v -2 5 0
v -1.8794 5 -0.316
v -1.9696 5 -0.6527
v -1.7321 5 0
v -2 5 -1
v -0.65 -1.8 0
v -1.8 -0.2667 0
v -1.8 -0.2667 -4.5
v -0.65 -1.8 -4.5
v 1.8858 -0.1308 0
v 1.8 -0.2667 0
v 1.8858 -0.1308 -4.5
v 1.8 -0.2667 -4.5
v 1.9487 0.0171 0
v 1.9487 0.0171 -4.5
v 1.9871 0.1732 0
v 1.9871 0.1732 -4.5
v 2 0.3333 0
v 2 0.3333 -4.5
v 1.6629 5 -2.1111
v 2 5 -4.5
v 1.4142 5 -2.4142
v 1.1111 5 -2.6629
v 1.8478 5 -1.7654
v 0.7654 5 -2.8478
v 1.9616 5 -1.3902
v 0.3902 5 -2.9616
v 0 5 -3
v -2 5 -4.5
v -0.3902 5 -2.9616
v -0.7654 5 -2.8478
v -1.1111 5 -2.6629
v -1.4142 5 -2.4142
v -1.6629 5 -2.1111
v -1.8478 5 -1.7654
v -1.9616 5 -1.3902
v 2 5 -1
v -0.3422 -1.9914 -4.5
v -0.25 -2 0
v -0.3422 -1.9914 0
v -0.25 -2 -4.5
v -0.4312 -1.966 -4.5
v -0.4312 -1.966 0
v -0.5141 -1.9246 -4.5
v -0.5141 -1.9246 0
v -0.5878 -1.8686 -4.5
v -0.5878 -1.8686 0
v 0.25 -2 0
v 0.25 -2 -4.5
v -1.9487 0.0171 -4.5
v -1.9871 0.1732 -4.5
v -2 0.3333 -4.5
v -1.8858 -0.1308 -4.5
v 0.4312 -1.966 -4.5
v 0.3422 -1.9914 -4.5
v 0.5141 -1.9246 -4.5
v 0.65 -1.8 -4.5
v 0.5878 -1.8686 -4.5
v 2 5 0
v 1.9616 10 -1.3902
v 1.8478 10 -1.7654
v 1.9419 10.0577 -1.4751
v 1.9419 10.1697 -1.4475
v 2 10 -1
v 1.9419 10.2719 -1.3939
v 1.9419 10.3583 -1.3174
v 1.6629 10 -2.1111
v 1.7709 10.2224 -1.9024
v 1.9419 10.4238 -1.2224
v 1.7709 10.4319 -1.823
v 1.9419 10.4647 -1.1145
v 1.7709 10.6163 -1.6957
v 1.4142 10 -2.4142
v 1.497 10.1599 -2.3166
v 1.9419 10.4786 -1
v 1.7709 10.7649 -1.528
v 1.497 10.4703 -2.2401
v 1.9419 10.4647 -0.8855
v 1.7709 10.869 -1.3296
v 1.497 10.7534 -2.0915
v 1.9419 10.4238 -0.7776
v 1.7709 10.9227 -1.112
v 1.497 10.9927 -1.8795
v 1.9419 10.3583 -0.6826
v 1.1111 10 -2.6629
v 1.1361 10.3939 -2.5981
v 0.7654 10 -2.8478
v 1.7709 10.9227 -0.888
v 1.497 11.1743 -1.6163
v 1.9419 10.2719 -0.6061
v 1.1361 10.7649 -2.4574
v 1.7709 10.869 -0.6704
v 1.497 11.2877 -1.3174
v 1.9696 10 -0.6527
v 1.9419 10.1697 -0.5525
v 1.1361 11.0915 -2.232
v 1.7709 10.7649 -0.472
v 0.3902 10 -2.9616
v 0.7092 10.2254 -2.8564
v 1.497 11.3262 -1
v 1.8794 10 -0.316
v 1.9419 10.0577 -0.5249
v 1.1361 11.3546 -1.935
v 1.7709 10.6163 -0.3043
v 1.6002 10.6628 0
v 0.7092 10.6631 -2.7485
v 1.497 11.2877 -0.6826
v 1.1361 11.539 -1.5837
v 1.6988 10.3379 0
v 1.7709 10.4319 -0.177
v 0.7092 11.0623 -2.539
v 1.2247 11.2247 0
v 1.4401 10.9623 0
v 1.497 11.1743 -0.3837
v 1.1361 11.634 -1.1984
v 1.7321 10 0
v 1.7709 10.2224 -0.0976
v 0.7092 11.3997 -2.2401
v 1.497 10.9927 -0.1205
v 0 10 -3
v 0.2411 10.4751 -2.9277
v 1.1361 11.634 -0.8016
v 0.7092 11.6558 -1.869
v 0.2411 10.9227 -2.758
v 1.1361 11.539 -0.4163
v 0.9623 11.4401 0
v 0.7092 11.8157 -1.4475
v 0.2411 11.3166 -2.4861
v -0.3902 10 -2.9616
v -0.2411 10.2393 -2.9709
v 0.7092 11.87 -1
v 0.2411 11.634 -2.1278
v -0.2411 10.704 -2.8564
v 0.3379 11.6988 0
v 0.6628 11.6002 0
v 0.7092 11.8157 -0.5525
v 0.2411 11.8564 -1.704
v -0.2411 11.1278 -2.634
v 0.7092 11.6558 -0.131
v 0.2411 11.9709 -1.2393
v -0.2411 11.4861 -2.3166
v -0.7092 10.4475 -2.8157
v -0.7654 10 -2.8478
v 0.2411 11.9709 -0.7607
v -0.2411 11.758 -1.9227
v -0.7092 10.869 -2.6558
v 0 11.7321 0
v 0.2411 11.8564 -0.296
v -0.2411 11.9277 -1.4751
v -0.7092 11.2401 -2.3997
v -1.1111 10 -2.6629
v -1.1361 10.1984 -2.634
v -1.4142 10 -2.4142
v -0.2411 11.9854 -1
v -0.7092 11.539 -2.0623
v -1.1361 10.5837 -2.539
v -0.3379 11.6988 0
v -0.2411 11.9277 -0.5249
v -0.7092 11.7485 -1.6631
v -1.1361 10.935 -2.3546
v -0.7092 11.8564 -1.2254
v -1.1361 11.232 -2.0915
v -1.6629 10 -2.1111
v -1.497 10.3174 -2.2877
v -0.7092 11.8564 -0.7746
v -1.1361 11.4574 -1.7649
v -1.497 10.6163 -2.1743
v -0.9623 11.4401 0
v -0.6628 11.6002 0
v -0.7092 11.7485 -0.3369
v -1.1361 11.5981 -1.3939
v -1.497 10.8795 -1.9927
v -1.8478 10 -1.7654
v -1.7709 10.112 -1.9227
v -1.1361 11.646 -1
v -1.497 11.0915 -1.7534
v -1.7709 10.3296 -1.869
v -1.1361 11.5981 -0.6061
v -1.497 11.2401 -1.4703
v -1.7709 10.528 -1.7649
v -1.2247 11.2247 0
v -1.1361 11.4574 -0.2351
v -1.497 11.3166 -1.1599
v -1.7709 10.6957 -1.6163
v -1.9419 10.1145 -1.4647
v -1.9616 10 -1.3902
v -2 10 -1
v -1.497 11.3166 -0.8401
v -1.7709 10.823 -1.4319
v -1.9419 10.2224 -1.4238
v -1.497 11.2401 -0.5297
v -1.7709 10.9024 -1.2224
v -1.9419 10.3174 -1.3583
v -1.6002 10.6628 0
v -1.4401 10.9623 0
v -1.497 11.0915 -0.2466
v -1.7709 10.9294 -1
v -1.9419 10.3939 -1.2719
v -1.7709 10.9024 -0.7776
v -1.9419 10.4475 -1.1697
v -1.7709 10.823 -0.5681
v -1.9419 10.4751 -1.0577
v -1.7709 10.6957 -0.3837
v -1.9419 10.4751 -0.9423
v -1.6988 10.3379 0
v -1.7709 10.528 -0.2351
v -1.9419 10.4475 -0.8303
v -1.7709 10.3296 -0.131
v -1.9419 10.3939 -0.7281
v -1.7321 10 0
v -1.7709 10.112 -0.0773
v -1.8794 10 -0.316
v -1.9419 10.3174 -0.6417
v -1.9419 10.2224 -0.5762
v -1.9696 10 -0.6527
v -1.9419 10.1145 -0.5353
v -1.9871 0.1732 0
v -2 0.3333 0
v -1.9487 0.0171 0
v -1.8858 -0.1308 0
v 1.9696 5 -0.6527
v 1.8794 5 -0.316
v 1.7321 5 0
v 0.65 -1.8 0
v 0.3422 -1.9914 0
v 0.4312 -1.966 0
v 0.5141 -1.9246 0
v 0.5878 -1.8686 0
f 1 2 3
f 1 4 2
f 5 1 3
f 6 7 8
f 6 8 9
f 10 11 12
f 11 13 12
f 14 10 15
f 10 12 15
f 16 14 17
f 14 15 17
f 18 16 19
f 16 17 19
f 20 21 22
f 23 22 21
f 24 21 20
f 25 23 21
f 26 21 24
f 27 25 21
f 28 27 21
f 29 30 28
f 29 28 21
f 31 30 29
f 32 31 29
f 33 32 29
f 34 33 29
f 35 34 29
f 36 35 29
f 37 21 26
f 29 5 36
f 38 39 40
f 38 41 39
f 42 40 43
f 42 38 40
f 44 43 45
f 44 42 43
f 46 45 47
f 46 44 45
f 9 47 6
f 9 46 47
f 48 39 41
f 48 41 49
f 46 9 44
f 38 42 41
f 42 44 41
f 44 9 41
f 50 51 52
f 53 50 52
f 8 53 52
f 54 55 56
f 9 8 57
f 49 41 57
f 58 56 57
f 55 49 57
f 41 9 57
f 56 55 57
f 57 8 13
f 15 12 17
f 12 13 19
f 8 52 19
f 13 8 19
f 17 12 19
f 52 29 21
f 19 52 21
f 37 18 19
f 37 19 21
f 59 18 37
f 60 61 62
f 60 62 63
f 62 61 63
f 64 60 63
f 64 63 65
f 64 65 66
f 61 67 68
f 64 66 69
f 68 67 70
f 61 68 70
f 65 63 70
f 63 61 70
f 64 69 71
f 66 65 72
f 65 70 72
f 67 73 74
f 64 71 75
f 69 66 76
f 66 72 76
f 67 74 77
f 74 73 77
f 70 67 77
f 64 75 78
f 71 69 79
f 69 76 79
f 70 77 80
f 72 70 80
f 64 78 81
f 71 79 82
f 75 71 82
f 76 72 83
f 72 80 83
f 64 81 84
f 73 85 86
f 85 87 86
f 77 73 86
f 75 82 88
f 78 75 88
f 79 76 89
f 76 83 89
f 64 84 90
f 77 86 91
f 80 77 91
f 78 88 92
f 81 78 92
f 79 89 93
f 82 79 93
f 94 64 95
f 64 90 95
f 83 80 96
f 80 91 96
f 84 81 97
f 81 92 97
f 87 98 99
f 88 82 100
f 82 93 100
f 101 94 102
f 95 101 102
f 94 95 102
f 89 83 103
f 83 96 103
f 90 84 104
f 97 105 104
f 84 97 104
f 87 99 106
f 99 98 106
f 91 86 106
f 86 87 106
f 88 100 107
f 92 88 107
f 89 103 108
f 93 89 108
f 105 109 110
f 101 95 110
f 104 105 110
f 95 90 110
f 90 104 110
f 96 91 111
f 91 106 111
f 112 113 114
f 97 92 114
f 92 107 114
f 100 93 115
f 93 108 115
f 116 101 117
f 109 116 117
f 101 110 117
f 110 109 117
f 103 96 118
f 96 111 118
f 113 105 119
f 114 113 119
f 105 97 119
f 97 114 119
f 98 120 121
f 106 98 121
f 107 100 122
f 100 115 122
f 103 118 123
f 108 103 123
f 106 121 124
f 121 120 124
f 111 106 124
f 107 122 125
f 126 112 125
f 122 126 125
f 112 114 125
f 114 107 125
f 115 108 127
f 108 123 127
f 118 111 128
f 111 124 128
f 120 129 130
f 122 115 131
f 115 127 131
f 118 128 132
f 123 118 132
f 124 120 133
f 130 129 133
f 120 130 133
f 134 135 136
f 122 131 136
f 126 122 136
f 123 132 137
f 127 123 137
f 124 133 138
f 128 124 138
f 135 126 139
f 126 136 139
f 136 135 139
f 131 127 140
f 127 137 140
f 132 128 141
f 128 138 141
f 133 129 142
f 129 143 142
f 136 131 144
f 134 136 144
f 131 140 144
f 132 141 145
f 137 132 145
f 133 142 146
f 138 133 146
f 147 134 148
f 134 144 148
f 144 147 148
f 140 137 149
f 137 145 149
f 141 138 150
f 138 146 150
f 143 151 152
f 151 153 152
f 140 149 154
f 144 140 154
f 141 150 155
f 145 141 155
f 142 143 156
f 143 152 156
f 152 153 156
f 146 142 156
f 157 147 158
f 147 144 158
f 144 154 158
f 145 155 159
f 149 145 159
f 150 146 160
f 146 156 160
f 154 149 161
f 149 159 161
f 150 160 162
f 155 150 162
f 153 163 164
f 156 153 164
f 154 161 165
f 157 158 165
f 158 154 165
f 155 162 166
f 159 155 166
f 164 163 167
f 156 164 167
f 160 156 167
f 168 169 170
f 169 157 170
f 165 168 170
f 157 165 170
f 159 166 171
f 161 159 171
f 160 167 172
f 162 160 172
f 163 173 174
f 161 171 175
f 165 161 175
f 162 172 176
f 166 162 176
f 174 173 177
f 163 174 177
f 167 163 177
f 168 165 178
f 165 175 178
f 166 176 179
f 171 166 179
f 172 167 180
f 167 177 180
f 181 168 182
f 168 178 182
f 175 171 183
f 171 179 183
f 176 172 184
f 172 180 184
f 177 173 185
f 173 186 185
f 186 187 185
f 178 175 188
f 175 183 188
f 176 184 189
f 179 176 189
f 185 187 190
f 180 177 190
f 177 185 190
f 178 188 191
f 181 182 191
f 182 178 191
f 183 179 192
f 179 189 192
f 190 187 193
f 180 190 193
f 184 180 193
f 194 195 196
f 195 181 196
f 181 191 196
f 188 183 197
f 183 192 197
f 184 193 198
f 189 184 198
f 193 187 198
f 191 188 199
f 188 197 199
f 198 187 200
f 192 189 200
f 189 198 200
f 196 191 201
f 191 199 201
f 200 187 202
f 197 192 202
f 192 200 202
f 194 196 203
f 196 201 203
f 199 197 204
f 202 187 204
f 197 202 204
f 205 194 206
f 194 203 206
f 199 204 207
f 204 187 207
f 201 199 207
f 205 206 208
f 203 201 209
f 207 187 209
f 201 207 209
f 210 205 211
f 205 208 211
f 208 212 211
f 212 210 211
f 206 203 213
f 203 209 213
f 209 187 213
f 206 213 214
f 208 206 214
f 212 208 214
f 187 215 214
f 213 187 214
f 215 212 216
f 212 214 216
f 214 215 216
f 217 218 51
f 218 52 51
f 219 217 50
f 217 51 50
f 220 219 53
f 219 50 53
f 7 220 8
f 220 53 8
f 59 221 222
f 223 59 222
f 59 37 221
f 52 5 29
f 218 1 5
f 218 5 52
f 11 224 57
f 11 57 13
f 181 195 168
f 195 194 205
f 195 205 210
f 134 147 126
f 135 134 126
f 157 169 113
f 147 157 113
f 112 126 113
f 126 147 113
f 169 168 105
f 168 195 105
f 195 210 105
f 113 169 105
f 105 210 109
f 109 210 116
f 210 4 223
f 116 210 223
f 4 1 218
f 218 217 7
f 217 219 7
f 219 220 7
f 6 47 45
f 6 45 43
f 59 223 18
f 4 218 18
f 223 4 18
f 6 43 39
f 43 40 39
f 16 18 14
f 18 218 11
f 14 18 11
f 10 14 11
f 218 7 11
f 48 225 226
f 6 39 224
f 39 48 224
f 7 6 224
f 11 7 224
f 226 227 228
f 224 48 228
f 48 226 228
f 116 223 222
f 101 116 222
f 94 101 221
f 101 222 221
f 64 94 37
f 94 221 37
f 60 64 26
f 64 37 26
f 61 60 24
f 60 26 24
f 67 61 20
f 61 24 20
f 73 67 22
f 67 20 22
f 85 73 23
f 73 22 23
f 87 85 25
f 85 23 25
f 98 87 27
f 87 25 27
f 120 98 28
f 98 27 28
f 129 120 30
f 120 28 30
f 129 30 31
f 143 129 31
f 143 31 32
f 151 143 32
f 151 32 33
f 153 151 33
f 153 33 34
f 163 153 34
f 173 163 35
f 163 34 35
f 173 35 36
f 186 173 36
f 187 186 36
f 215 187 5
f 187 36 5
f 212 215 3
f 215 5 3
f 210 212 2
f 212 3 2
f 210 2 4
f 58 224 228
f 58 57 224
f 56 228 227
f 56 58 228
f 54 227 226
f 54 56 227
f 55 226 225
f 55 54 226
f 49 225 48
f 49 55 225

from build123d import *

# Parameters (mm, degrees)
EXTRUDE_1_DEPTH          = 4.5
EXTRUDE_2_DEPTH          = 5
SKETCH_4_W               = 4.107505073
SKETCH_4_H               = 2.274071006
CUT_EXTRUDE_1_DEPTH      = 13
CUT_EXTRUDE_1_DEPTH_BACK = 3
FILLET_1_R               = 1
FILLET_2_R               = 0.5


with BuildPart() as part:
    # Эскиз1 → Бобышка-Вытянуть1 (new body)
    with BuildSketch(Plane.XY):
        Polygon((2, 0), (2, 5), (-2, 5), (-2, 0), (-0.5, -2), (0.5, -2), align=None)
    extrude(amount=-EXTRUDE_1_DEPTH)

    # Эскиз2 → Бобышка-Вытянуть2 (add)
    with BuildSketch(Plane(origin=(0, 5, 0), x_dir=(1, 0, 0), z_dir=(0, 1, 0))):
        with BuildLine():
            Line((-1.732050808, 0), (1.732050808, 0))
            ThreePointArc((1.732050808, 0), (0, 3), (-1.732050808, 0))
        make_face()
    extrude(amount=EXTRUDE_2_DEPTH)

    # Эскиз3 → Повернуть1 (revolve)
    with BuildSketch(Plane(origin=(0, 10, 0), x_dir=(1, 0, 0), z_dir=(0, 1, 0))):
        with BuildLine():
            ThreePointArc((2, 1), (0, 3), (-2, 1))
            Line((-2, 1), (2, 1))
        make_face()
    revolve(axis=Axis((-2, 10, -1), (1, 0, 0)))

    # Эскиз4 → Вырез-Вытянуть1 (cut, two sides)
    with BuildSketch(Plane(origin=(0, 0, 0), x_dir=(1, 0, 0), z_dir=(0, 1, 0))) as cut_extrude_1_sk:
        with Locations((0.053752537, -1.137035503)):
            Rectangle(SKETCH_4_W, SKETCH_4_H)
    extrude(amount=CUT_EXTRUDE_1_DEPTH, mode=Mode.SUBTRACT)
    extrude(cut_extrude_1_sk.sketch, amount=-CUT_EXTRUDE_1_DEPTH_BACK, mode=Mode.SUBTRACT)

    # Скругление1
    fillet_1_edges = [part.edges().sort_by_distance(p)[0] for p in [
        (2, 0, -2.25),
        (-2, 0, -2.25),
    ]]
    fillet(fillet_1_edges, radius=FILLET_1_R)

    # Скругление2
    fillet_2_edges = [part.edges().sort_by_distance(p)[0] for p in [
        (0.5, -2, -2.25),
        (-0.5, -2, -2.25),
    ]]
    fillet(fillet_2_edges, radius=FILLET_2_R)


solid = part.part
